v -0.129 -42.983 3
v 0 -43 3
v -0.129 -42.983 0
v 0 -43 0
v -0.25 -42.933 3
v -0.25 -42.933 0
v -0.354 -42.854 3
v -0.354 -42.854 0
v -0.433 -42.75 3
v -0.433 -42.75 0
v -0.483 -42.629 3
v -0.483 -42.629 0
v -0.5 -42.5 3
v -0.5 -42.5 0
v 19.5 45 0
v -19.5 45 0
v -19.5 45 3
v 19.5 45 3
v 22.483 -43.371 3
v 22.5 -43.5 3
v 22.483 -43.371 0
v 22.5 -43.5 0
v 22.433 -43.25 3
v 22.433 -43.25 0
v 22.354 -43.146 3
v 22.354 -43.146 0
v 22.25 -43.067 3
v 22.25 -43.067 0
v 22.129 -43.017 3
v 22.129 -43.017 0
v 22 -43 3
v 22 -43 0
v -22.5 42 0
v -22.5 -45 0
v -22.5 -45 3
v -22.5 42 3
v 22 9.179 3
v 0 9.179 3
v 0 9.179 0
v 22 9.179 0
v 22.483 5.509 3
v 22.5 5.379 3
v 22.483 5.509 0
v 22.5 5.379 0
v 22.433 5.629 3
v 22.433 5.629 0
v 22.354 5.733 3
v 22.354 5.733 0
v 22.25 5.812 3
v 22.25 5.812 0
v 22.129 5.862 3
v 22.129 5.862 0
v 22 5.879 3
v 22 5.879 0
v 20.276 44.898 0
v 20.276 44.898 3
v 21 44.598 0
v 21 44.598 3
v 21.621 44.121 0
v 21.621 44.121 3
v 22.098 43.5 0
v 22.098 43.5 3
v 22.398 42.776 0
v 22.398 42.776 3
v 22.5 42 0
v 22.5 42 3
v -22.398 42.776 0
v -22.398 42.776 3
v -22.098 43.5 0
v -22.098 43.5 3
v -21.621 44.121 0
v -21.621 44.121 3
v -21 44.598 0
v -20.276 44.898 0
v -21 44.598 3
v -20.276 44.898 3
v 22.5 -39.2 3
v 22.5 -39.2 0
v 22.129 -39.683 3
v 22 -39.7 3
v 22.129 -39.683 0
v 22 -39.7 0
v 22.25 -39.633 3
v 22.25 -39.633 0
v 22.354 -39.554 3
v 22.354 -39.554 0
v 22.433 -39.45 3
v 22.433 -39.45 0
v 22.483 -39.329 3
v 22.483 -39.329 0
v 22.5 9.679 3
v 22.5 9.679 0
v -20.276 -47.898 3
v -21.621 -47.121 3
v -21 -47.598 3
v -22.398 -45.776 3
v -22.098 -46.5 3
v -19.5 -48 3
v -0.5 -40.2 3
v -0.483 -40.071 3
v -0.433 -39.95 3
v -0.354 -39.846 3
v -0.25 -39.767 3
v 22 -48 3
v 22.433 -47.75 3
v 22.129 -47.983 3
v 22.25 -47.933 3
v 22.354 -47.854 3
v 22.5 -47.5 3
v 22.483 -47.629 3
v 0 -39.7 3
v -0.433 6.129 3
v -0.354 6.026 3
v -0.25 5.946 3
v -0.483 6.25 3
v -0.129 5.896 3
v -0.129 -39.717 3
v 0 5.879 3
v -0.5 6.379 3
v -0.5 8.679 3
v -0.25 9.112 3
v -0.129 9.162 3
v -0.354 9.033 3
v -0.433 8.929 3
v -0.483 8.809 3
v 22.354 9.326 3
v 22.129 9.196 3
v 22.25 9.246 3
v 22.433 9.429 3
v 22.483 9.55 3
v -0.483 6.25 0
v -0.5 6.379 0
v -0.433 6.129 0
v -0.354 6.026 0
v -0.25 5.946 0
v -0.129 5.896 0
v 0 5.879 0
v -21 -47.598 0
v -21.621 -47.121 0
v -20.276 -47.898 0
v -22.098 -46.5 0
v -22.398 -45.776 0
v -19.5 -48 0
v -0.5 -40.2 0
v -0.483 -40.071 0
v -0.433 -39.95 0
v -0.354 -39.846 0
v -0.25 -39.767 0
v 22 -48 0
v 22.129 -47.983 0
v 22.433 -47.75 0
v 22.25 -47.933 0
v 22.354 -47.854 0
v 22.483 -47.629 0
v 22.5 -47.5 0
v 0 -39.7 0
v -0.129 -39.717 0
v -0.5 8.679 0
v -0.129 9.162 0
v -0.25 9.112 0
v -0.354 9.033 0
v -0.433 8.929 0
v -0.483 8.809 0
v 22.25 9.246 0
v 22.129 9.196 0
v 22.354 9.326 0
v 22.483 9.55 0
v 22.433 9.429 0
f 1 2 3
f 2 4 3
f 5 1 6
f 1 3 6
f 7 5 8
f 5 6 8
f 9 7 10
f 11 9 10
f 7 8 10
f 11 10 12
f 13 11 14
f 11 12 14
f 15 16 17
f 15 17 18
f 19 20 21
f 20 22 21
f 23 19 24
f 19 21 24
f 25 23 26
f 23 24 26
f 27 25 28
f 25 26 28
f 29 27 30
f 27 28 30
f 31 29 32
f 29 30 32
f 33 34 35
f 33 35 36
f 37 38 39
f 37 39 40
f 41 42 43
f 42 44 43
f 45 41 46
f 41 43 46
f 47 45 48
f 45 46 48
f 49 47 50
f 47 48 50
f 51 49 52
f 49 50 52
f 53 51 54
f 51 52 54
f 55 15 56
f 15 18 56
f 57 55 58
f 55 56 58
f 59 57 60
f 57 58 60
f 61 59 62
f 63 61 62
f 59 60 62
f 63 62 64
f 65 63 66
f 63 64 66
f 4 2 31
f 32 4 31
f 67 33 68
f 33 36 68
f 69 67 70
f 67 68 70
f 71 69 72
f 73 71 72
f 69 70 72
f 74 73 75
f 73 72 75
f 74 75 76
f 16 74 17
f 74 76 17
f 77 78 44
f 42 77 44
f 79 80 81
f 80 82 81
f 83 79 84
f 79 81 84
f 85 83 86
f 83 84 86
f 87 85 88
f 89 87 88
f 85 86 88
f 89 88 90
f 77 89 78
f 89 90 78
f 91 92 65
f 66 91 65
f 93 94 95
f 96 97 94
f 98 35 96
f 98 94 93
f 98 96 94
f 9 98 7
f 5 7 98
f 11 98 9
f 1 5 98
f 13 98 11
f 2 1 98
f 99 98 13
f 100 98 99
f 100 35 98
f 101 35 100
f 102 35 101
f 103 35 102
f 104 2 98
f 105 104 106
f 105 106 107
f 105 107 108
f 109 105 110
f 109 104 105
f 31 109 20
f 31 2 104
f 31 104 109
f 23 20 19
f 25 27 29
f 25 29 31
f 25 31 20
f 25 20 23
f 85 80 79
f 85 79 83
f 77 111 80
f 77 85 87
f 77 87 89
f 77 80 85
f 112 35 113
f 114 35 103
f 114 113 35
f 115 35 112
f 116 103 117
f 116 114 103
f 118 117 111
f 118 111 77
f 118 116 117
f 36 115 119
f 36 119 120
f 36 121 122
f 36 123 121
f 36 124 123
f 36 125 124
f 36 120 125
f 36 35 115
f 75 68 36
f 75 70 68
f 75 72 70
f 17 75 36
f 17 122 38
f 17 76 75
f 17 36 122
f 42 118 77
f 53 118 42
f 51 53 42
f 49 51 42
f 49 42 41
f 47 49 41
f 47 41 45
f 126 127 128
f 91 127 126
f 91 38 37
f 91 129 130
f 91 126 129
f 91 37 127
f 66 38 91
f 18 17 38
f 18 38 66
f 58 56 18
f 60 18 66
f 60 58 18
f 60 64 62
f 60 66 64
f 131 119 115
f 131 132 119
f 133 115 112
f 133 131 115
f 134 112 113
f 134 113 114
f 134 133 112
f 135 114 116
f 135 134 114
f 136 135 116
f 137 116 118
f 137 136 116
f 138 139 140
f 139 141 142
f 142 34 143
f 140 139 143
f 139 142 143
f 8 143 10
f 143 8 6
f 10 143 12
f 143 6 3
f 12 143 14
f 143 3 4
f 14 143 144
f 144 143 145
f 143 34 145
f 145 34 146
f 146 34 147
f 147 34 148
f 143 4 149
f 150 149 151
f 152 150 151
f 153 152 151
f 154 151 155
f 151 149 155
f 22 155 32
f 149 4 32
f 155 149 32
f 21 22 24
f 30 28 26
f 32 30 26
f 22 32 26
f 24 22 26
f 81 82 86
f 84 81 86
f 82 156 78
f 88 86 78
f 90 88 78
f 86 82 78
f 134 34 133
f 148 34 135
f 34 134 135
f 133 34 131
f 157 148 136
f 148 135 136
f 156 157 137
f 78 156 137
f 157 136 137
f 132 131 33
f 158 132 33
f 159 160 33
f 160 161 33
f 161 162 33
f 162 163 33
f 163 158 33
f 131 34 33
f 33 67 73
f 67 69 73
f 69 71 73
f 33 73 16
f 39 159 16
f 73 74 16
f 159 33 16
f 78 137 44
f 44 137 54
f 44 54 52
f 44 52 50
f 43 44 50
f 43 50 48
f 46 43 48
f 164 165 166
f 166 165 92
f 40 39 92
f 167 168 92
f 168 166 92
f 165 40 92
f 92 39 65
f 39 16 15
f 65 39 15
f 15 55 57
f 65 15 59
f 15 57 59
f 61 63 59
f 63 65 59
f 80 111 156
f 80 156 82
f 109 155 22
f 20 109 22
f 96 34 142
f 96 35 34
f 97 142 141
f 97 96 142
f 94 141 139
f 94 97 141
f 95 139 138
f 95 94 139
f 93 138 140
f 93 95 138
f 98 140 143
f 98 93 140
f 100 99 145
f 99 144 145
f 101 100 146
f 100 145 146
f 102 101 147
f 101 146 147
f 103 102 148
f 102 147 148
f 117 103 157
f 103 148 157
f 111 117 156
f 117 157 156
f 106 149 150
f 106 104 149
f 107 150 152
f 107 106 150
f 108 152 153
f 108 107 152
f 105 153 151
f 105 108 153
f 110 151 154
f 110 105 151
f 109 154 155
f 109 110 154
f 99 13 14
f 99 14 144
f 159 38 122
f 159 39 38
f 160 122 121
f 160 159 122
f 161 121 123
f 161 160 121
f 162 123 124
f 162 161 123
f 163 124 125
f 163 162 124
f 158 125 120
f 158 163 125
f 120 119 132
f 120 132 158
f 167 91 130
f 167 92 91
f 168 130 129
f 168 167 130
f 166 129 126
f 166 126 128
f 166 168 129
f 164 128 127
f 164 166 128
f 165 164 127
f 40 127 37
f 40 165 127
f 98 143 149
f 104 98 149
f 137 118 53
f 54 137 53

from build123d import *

# Parameters (mm, degrees)
CROQUIS1_W              = 45
CROQUIS1_H              = 93
SALIENTE_EXTRUIR1_DEPTH = 3
CROQUIS2_W              = 23
CROQUIS2_H              = 3.3
CORTAR_EXTRUIR1_DEPTH   = 3
CROQUIS3_W              = 23
CROQUIS3_H              = 3.3
CORTAR_EXTRUIR2_DEPTH   = 3
REDONDEO1_R             = 3
REDONDEO2_R             = 0.5


with BuildPart() as part:
    # Croquis1 → Saliente-Extruir1 (new body)
    with BuildSketch(Plane.XY):
        with Locations((0, -1.5)):
            Rectangle(CROQUIS1_W, CROQUIS1_H)
    extrude(amount=SALIENTE_EXTRUIR1_DEPTH)

    # Croquis2 → Cortar-Extruir1 (cut)
    with BuildSketch(Plane.XY.offset(3)):
        with Locations((11, 7.529451896)):
            Rectangle(CROQUIS2_W, CROQUIS2_H)
    extrude(amount=-CORTAR_EXTRUIR1_DEPTH, mode=Mode.SUBTRACT)

    # Croquis3 → Cortar-Extruir2 (cut)
    with BuildSketch(Plane.XY.offset(3)):
        with Locations((11, -41.35)):
            Rectangle(CROQUIS3_W, CROQUIS3_H)
    extrude(amount=-CORTAR_EXTRUIR2_DEPTH, mode=Mode.SUBTRACT)

    # Redondeo1
    redondeo1_edges = [part.edges().sort_by_distance(p)[0] for p in [
        (-22.5, 45, 1.5),
        (-22.5, -48, 1.5),
        (22.5, 45, 1.5),
    ]]
    fillet(redondeo1_edges, radius=REDONDEO1_R)

    # Redondeo2
    redondeo2_edges = [part.edges().sort_by_distance(p)[0] for p in [
        (-0.5, 9.179451896, 1.5),
        (-0.5, 5.879451896, 1.5),
        (22.5, 5.879451896, 1.5),
        (22.5, 9.179451896, 1.5),
        (-0.5, -39.7, 1.5),
        (-0.5, -43, 1.5),
        (22.5, -43, 1.5),
        (22.5, -39.7, 1.5),
        (22.5, -48, 1.5),
    ]]
    fillet(redondeo2_edges, radius=REDONDEO2_R)


solid = part.part
